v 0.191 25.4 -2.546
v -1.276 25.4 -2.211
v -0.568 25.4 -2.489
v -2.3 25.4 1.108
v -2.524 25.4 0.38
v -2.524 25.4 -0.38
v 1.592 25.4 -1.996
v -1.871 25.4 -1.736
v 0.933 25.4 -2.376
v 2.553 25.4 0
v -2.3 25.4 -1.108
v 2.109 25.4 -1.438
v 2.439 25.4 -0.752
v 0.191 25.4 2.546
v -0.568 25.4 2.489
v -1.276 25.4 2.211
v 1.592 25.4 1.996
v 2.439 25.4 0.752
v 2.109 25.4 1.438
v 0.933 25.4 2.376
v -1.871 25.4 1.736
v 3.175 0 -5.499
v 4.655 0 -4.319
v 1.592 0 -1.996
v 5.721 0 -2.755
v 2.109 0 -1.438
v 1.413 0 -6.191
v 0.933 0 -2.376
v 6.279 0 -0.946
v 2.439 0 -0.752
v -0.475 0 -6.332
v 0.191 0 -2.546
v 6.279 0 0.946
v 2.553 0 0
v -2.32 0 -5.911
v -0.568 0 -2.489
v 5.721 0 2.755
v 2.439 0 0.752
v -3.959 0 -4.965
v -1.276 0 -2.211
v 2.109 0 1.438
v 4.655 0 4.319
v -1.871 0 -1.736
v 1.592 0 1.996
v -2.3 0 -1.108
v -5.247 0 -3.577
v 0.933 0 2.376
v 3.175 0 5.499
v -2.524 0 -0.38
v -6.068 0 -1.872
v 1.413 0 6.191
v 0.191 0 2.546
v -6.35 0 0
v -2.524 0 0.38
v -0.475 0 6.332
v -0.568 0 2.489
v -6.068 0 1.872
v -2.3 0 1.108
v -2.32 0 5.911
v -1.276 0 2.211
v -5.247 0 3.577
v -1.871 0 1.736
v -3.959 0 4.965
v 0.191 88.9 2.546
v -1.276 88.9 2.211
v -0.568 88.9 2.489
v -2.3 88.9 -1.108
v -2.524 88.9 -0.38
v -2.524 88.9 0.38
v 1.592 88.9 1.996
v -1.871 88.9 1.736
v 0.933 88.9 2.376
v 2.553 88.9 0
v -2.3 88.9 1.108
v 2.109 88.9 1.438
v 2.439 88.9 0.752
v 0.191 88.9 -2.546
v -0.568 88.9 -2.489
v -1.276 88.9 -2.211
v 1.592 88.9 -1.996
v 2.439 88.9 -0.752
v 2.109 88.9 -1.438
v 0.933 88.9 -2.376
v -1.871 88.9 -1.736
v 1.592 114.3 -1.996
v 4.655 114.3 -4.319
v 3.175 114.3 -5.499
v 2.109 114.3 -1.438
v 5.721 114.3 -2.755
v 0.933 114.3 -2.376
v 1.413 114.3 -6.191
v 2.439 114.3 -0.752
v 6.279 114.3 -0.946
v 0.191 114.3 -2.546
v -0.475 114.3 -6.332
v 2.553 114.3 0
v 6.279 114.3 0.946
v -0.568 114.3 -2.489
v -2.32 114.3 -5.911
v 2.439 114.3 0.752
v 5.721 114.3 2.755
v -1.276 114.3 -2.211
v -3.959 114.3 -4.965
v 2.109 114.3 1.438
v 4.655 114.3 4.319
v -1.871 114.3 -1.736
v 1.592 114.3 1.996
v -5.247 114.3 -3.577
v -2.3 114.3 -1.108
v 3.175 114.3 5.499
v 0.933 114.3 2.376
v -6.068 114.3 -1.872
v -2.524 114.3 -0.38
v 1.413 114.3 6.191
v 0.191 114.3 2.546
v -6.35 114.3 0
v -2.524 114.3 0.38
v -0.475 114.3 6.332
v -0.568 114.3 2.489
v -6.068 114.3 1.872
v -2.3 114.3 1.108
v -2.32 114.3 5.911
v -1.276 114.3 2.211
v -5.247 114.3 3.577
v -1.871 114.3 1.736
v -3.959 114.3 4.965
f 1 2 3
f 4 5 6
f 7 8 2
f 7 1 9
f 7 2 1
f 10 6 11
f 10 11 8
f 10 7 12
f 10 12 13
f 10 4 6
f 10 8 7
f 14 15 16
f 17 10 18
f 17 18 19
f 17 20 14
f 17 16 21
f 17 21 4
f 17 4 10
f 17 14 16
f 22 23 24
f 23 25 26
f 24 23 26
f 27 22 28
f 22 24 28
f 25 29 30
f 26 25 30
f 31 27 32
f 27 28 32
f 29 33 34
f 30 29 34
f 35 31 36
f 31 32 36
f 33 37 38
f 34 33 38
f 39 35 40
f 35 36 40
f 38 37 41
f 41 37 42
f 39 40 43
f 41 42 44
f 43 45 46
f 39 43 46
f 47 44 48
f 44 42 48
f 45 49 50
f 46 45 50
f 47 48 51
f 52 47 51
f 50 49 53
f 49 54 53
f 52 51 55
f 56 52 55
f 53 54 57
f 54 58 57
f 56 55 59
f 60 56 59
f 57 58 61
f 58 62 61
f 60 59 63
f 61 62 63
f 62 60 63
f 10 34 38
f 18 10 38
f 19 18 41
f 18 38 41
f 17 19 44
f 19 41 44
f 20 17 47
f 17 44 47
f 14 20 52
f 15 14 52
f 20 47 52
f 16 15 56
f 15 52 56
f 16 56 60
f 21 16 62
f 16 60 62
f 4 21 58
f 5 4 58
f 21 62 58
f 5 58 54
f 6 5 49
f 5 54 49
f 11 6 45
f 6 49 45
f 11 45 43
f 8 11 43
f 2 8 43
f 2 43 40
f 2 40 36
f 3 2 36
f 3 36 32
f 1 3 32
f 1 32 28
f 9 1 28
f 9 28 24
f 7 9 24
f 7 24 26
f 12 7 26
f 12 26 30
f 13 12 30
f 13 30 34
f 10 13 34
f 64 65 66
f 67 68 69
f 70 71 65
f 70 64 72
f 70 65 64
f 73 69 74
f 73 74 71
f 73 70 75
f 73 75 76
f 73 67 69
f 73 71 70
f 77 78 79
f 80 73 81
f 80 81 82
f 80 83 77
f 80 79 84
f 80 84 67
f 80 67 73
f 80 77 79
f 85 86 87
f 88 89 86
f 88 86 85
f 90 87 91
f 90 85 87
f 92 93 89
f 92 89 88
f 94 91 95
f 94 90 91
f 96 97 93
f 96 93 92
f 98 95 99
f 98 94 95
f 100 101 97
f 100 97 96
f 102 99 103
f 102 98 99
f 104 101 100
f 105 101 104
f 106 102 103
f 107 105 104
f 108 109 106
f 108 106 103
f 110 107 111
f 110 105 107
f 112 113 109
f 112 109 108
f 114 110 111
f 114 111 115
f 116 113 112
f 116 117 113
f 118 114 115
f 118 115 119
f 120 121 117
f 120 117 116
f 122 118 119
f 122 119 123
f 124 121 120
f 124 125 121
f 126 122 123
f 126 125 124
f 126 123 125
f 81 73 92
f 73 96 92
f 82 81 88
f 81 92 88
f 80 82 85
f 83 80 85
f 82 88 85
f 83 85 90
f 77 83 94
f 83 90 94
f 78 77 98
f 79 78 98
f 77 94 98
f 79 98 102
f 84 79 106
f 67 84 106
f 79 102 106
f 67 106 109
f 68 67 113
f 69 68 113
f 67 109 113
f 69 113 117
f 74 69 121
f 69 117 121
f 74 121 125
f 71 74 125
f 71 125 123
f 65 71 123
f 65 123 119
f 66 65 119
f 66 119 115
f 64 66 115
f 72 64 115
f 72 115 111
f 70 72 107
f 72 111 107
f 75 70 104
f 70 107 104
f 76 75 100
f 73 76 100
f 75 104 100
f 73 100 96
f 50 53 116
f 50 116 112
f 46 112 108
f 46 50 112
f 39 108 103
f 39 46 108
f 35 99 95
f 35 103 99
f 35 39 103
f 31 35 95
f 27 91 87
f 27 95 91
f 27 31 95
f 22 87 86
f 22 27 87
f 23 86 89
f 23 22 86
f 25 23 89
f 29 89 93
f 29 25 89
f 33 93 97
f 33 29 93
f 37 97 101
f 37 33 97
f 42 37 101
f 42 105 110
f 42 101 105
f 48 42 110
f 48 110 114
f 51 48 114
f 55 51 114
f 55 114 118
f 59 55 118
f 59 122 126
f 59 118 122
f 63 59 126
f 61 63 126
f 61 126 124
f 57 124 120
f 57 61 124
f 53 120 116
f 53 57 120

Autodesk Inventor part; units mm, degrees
ref_plane "YZ Plane" through (0, 0, 0) normal (1, 0, 0) x (0, 1, 0)
ref_plane "XZ Plane" through (0, 0, 0) normal (0, 1, 0) x (-1, 0, 0)
ref_plane "XY Plane" through (0, 0, 0) normal (0, 0, 1) x (1, 0, 0)
sketch "Sketch1" plane through (0, 0, 0) normal (0, 1, 0) x (-1, 0, 0)
  circle A0 centre (0, 0) radius 6.35
  dimension "d0" = 12.7
extrude "Extrusion1" add sketch "Sketch1" along normal blind 114.3
sketch "Sketch2" plane through (0, 0, 0) normal (0, -1, 0) x (1, 0, 0)
  circle A0 centre (0, 0) radius 2.5527
  dimension "d3" = 5.1054
sketch "Sketch3" plane through (0, 114.3, 0) normal (0, 1, 0) x (1, 0, 0)
  circle A0 centre (0, 0) radius 2.5527
  dimension "d4" = 5.1054
extrude "Extrusion2" cut sketch "Sketch3" against normal blind 25.4
extrude "Extrusion3" cut sketch "Sketch2" against normal blind 25.4
properties part number "INDX_002_Standoff" material "Aluminum 6061"
